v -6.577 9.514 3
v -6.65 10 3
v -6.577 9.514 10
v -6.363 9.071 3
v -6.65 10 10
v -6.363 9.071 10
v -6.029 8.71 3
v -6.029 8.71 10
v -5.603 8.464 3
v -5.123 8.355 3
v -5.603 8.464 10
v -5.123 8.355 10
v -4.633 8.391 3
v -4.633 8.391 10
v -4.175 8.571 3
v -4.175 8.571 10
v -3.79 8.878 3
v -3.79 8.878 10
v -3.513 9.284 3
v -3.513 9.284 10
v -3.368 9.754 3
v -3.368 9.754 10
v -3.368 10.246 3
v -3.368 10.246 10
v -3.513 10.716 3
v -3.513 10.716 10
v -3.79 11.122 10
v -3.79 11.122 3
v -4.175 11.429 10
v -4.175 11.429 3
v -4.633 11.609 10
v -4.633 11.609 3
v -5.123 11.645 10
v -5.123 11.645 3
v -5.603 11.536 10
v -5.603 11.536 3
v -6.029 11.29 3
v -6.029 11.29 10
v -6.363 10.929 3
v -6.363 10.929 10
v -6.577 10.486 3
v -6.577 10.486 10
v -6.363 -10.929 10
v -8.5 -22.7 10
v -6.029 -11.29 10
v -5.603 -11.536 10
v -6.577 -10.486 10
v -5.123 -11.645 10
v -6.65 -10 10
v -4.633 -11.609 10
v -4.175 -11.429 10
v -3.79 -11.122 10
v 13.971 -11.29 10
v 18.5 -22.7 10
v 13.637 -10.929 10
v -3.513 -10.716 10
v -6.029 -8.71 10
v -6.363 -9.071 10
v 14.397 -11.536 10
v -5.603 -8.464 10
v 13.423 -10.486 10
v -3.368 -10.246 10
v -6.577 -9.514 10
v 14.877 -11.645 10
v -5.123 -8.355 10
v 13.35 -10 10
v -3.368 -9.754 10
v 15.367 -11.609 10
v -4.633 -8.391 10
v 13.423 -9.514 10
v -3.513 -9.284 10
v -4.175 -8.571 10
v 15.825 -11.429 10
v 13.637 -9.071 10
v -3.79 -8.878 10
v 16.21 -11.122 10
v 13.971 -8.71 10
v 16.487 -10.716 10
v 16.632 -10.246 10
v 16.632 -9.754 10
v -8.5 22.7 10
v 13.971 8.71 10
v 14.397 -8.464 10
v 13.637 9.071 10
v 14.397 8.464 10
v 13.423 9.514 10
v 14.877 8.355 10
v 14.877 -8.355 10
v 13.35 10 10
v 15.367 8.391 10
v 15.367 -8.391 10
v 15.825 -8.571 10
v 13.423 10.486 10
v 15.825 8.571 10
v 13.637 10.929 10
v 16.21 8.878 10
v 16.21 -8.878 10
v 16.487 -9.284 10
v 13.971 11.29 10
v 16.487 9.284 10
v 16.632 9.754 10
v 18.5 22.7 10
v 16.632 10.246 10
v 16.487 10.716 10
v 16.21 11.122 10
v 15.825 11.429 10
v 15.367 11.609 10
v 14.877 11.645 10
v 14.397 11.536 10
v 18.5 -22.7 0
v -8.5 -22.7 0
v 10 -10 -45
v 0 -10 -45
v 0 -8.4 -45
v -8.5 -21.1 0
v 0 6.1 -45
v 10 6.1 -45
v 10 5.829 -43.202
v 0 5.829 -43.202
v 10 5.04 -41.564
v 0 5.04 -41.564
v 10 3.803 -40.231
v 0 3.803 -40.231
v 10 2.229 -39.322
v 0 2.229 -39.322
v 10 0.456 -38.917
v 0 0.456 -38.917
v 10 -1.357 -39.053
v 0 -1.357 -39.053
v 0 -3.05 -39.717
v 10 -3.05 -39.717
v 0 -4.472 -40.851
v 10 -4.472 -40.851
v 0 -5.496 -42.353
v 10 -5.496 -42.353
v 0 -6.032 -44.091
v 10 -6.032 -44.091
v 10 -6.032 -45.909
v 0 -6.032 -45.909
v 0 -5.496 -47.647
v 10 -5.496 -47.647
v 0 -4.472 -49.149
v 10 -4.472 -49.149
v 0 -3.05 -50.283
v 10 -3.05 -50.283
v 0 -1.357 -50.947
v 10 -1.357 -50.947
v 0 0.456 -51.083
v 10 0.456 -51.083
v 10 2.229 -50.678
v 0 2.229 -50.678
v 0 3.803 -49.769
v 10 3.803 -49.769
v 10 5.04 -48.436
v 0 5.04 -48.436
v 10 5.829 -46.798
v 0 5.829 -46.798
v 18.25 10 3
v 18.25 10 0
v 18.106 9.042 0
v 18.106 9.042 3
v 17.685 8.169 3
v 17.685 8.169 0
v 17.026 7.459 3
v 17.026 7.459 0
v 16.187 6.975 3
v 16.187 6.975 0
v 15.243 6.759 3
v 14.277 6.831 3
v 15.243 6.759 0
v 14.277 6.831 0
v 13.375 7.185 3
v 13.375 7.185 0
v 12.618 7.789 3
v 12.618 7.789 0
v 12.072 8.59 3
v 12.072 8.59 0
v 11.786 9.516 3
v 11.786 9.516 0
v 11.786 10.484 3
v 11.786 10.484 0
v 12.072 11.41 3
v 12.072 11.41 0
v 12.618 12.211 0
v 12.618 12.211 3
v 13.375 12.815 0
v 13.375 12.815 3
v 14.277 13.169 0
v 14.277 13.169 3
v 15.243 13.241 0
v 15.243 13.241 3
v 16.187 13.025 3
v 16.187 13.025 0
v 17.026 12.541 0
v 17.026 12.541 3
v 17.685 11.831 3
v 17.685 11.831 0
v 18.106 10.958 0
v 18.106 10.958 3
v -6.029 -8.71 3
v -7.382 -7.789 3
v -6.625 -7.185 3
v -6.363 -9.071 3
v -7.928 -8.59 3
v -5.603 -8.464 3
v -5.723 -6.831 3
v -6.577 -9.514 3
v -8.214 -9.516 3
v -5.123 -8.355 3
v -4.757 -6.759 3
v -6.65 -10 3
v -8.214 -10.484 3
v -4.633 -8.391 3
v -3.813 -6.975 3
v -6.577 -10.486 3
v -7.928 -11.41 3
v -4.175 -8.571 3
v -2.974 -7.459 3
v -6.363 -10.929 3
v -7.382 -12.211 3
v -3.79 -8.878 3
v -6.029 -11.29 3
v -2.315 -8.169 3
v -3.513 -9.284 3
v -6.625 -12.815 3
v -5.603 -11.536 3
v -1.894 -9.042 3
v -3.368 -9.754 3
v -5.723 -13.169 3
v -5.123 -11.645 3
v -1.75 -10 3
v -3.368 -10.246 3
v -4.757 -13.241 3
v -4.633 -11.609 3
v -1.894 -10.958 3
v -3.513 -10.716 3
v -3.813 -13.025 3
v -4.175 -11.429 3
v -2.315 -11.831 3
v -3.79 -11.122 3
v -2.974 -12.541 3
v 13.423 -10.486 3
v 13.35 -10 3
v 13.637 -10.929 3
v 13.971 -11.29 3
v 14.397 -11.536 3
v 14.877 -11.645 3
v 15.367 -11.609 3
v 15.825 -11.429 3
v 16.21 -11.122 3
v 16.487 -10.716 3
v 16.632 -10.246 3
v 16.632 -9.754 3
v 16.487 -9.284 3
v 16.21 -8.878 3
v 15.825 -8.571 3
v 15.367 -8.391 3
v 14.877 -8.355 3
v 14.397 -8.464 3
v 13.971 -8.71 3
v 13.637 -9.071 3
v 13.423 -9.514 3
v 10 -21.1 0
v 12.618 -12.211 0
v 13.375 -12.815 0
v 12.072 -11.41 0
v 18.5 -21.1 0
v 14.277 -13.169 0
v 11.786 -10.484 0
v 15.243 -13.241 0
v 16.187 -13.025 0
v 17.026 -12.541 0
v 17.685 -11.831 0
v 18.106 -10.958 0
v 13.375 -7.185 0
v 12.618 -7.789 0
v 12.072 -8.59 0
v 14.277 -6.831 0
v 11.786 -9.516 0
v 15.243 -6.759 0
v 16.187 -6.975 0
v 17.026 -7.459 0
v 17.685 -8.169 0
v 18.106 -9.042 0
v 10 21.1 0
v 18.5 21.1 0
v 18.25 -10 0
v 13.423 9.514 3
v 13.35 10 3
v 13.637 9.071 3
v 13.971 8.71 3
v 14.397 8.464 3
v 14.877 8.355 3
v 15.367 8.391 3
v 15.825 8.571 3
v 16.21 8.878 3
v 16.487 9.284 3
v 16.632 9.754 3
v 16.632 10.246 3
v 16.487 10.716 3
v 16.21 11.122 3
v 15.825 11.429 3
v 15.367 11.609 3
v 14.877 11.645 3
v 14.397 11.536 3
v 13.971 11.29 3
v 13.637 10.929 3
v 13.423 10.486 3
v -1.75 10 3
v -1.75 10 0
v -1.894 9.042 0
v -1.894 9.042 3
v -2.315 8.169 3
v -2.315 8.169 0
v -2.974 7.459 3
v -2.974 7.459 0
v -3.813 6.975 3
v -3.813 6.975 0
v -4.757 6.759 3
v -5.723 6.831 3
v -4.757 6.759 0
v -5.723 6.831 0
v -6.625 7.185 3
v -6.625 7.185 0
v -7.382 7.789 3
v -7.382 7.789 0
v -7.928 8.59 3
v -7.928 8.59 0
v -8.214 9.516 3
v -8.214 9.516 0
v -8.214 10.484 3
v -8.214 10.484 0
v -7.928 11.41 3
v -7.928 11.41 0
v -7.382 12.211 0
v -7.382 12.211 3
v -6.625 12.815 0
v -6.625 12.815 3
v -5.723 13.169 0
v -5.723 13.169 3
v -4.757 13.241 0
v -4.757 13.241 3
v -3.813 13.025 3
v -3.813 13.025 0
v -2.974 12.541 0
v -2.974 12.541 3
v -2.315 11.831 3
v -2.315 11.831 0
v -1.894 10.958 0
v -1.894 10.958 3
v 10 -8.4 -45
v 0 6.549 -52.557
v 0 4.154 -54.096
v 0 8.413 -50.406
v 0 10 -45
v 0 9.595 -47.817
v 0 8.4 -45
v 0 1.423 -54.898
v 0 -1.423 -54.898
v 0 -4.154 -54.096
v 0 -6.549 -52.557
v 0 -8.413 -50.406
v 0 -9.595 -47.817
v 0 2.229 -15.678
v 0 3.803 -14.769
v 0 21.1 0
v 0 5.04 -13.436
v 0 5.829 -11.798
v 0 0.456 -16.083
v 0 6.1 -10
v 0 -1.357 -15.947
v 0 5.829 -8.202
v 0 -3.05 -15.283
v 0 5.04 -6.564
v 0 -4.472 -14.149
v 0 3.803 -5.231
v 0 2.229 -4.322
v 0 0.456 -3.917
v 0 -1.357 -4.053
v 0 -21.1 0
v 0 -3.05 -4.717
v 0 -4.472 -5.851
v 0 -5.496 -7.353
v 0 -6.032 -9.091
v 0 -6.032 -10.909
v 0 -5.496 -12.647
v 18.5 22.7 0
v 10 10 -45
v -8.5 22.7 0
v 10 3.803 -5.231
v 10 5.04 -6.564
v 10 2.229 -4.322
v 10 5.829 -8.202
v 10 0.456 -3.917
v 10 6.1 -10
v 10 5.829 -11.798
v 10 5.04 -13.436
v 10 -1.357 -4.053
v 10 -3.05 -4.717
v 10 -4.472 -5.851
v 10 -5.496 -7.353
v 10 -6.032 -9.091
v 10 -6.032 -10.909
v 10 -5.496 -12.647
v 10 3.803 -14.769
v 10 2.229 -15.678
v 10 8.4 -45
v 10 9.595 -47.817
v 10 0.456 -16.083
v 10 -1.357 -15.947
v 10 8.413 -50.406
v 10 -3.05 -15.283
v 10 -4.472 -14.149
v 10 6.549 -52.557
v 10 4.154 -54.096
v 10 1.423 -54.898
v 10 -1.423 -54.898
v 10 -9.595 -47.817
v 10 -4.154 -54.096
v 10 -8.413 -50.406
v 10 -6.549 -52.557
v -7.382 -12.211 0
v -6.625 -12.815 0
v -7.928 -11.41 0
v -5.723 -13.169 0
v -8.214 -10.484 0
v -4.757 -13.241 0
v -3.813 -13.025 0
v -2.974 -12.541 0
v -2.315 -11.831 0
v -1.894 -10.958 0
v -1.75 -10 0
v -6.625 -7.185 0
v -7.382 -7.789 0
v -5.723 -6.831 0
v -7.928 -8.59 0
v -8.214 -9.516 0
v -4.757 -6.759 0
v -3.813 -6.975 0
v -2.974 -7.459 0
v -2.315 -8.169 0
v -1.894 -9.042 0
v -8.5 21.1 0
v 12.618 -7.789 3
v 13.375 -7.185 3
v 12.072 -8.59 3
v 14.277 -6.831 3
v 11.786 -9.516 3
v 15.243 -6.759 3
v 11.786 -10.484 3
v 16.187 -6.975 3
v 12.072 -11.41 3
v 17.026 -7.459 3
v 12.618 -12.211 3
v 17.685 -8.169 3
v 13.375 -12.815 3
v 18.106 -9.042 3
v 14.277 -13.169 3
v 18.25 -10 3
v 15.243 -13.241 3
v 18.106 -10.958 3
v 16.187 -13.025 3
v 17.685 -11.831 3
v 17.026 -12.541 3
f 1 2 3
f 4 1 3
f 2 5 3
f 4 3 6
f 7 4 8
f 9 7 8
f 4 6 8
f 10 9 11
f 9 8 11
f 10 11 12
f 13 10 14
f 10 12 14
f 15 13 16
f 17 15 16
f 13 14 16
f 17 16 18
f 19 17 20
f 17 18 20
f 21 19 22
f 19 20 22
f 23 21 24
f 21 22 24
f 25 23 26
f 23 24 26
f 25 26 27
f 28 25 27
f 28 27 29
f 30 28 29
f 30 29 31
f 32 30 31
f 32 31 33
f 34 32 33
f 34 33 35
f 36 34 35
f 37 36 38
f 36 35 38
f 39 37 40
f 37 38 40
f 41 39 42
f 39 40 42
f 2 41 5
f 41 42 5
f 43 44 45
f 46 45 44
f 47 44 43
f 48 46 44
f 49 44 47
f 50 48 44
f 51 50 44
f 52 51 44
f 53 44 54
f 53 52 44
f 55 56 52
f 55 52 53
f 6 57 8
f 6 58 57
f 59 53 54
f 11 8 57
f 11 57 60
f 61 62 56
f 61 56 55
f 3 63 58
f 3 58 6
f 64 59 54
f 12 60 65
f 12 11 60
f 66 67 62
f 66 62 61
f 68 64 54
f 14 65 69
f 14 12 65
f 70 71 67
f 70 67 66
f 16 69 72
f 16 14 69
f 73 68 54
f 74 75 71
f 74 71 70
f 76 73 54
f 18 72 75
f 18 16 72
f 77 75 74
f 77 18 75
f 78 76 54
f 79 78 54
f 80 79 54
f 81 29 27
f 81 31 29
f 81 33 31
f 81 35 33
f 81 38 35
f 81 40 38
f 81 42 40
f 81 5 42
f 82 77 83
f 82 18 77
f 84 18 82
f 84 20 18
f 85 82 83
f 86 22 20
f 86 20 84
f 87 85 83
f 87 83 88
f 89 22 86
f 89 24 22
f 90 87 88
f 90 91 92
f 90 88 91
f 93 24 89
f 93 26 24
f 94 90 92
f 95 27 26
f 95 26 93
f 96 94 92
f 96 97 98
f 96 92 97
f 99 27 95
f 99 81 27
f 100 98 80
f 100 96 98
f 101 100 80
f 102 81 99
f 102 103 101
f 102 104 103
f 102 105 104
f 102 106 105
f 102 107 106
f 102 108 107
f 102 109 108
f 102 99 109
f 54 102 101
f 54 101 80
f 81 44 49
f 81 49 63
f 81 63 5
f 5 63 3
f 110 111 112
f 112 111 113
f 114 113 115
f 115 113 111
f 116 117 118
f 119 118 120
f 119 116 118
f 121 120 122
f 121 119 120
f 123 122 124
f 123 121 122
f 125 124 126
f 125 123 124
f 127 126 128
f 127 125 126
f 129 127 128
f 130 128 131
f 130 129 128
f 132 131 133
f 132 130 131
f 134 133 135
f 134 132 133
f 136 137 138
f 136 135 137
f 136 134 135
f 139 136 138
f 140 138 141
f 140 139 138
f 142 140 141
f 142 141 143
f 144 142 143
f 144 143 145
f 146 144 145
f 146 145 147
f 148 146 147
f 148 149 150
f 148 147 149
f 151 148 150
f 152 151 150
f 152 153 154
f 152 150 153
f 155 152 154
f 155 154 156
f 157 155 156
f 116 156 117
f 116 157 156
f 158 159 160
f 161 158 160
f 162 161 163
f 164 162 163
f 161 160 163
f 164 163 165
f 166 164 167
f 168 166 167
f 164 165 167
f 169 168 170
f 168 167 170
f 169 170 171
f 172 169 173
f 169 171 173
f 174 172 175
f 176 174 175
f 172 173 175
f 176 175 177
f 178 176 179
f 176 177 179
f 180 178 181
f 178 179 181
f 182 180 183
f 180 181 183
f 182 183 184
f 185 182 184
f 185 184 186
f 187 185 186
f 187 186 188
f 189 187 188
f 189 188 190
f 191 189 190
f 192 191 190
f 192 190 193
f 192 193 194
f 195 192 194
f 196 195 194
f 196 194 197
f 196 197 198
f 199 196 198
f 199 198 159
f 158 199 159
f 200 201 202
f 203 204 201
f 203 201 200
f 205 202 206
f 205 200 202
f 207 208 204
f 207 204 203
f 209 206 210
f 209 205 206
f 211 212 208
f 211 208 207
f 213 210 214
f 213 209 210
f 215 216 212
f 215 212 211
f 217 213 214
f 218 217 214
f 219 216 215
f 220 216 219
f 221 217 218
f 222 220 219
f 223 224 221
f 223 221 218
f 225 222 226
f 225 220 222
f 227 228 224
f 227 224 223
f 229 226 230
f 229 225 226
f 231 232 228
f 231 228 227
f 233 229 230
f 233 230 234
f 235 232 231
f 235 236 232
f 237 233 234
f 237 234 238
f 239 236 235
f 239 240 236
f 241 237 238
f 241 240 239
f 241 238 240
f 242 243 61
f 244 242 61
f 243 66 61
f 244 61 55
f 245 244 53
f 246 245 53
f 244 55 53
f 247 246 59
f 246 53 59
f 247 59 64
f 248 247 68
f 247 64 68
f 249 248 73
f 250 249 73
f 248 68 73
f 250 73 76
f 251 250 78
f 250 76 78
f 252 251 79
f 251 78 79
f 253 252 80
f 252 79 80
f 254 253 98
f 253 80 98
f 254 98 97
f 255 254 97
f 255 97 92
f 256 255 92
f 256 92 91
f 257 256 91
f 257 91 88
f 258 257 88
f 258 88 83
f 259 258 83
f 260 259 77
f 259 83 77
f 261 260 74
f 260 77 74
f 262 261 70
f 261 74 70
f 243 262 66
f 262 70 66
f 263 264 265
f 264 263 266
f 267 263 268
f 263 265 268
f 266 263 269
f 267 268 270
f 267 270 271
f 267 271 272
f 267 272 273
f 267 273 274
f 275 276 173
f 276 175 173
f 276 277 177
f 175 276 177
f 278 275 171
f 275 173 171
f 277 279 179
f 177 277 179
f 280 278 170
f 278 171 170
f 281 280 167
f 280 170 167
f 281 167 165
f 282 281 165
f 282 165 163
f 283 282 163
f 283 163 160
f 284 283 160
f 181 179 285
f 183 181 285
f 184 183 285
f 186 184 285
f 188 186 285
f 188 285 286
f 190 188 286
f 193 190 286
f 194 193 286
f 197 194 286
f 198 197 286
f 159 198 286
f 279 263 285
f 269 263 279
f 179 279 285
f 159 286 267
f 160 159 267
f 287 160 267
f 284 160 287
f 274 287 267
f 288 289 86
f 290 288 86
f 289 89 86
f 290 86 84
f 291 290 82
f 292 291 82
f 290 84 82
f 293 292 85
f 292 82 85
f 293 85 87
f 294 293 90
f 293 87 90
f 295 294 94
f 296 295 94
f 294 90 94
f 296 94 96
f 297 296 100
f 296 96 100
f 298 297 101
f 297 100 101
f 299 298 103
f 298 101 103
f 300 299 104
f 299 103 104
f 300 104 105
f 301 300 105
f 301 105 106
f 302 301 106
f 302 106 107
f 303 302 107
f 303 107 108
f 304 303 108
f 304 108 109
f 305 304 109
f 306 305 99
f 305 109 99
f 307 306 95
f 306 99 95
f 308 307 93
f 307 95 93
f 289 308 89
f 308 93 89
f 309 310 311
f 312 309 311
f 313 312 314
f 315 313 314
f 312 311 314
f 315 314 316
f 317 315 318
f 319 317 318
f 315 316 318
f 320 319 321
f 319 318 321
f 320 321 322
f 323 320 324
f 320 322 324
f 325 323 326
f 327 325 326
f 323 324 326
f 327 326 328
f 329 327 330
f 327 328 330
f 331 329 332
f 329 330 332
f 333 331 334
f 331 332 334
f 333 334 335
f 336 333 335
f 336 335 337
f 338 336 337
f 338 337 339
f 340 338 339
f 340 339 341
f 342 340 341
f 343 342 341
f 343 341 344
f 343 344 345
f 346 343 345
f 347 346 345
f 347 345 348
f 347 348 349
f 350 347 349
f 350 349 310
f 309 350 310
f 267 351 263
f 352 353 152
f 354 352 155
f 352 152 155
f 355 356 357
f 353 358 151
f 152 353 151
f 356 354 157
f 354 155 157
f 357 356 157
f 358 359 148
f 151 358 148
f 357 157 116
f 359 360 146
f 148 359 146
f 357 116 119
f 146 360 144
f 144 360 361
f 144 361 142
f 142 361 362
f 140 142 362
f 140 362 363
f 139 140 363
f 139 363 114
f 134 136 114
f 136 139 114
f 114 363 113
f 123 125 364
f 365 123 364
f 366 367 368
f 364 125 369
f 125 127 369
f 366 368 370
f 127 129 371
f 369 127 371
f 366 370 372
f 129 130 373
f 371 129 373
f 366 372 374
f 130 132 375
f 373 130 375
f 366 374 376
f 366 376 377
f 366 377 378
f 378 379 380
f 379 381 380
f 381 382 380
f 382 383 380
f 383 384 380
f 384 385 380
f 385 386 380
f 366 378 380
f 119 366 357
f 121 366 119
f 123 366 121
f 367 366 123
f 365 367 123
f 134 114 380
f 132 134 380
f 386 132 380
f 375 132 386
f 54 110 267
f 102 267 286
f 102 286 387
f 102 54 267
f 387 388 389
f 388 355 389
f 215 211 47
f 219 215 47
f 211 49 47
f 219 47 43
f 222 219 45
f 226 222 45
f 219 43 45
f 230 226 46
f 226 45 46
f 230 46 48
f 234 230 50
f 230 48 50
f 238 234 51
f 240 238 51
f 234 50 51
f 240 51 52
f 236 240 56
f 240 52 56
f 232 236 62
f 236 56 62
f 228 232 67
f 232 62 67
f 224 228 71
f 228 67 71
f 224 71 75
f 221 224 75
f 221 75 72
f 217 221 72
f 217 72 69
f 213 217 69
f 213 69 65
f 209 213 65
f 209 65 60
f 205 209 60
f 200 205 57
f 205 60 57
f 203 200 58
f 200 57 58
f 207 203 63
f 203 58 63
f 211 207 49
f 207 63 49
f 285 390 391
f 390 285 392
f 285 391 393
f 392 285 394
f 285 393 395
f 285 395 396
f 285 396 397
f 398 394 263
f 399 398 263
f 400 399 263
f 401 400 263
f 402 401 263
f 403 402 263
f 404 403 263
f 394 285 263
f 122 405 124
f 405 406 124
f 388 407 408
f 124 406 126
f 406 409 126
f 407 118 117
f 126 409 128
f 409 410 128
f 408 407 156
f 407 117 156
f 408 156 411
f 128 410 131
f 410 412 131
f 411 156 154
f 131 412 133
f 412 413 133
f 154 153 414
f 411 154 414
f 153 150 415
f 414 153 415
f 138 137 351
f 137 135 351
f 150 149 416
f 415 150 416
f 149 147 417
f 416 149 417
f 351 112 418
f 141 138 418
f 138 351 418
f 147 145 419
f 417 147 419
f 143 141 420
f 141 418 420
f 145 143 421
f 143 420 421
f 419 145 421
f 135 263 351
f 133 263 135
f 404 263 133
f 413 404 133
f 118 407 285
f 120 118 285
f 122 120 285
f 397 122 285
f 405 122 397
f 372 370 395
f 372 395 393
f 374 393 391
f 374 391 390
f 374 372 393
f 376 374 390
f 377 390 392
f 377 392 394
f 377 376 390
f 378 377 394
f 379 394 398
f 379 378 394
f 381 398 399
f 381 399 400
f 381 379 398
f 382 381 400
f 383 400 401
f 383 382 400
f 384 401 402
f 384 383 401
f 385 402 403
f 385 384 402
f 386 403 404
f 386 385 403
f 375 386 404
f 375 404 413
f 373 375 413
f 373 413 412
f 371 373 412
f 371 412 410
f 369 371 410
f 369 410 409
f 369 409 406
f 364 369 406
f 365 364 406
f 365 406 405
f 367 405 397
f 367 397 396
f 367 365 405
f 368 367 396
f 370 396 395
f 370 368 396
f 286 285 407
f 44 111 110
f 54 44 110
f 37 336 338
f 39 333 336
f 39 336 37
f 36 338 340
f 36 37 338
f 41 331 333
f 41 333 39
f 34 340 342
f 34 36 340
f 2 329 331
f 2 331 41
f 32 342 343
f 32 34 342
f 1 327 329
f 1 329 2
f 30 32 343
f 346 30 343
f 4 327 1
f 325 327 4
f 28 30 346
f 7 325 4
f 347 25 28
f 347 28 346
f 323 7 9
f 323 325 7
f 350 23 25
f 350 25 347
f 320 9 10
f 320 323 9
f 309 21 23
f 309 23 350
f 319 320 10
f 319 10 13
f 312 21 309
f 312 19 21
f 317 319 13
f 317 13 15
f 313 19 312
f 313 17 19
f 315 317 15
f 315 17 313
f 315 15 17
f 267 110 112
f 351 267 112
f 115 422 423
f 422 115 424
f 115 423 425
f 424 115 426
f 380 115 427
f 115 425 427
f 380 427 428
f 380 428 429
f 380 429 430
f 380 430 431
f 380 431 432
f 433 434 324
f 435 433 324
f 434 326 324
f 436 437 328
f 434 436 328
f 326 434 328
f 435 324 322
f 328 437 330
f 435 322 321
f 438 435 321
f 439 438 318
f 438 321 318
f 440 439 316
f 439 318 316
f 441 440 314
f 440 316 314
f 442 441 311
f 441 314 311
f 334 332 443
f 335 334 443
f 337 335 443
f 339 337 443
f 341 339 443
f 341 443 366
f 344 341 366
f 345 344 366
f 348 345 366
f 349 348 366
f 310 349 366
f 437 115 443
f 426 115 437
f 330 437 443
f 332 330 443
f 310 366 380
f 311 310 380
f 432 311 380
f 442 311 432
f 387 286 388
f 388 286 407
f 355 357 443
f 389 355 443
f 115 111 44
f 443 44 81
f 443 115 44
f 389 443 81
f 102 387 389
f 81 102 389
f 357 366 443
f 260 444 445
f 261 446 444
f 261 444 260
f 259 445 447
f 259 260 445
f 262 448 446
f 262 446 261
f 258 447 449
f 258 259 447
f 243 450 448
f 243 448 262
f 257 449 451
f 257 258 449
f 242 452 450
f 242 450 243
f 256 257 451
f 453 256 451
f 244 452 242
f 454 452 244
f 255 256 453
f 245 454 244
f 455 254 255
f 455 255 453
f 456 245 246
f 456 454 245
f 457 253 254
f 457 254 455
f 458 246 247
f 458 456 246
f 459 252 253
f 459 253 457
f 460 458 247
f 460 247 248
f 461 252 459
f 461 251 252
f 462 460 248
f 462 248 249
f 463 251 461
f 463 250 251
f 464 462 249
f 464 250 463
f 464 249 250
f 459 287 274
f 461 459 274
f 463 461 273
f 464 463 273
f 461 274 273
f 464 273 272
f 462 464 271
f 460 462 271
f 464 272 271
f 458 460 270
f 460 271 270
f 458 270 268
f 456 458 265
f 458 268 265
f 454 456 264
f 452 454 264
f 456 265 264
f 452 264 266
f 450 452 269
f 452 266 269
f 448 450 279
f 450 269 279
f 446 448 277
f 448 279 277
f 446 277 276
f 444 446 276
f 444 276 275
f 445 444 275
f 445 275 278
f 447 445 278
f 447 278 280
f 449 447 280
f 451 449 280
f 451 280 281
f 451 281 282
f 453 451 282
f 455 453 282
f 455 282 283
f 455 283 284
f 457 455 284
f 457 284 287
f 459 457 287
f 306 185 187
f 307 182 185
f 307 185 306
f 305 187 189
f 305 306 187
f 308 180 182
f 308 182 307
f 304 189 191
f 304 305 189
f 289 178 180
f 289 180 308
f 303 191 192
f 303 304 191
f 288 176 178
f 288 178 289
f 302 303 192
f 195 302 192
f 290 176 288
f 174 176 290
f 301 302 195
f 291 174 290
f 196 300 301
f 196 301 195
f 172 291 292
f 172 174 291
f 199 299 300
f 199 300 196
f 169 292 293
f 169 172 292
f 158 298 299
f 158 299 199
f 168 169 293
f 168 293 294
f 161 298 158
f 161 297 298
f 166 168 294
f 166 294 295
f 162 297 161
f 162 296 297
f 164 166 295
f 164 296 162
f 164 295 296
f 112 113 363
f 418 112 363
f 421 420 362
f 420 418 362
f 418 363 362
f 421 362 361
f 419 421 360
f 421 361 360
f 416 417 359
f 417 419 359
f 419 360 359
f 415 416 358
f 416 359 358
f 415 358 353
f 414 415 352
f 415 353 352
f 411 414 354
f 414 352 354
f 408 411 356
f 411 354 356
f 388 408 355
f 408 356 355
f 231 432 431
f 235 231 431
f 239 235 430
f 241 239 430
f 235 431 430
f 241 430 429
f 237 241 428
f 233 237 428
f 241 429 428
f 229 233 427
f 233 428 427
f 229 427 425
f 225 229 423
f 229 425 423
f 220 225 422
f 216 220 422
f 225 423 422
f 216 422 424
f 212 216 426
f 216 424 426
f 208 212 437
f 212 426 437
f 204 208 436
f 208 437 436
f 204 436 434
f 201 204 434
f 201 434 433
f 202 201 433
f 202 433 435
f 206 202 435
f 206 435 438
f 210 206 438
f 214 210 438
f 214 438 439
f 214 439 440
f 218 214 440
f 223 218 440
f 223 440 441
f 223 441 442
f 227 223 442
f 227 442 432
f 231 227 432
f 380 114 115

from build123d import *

# Parameters (mm, degrees)
F0_R           = 6.1
F1_DEPTH       = 10
F2_W           = 8.5
F2_H           = 45.4
F2_W_2         = 10
F3_DEPTH       = 10
F5_D           = 3.3
F5_CBORE_D     = 6.5
F5_CBORE_DEPTH = 3
F7_DEPTH       = 8.5
F7_DEPTH_BACK  = 18.5
F9_DEPTH       = 45.401


with BuildPart() as f1:
    # F0 (on Right) → F1 (new body)
    with BuildSketch(Plane.YZ):
        with BuildLine():
            Line((22.7, 0), (0, 0))
            Line((0, 0), (-22.7, 0))
            Line((-22.7, 0), (-10, -45))
            ThreePointArc((-10, -45), (0, -35), (10, -45))
            Line((10, -45), (22.7, 0))
        make_face()
        with Locations((0, -10)):
            Circle(F0_R, mode=Mode.SUBTRACT)
        with BuildLine():
            ThreePointArc((10, -45), (0, -35), (-10, -45))
            ThreePointArc((-10, -45), (0, -55), (10, -45))
        make_face()
        with Locations((0, -45)):
            Circle(F0_R, mode=Mode.SUBTRACT)
    extrude(amount=F1_DEPTH)

    # F2 (on face) → F3 (join)
    with BuildSketch(Plane.XY):
        with Locations((14.25, 0)):
            Rectangle(F2_W, F2_H)
        with Locations((5, 0)):
            Rectangle(F2_W_2, F2_H)
        with Locations((-4.25, 0)):
            Rectangle(F2_W, F2_H)
    extrude(amount=F3_DEPTH)

    # F5 (through all)
    with Locations(Plane(origin=(0, 0, 0), x_dir=(1, 0, 0), z_dir=(0, 0, -1))):
        with Locations((-5, 10), (15, 10), (15, -10), (-5, -10)):
            CounterBoreHole(F5_D / 2, F5_CBORE_D / 2, F5_CBORE_DEPTH)

    # F6 (on face) → F7 (join, two sides)
    with BuildSketch(Plane.YZ.offset(10)) as f7_sk:
        with BuildLine():
            Line((21.1, 0), (8.4, -45))
            ThreePointArc((8.4, -45), (0, -53.4), (-8.4, -45))
            Line((-8.4, -45), (-21.1, 0))
            Line((-21.1, 0), (-22.7, 0))
            Line((-22.7, 0), (-10, -45))
            ThreePointArc((-10, -45), (0, -55), (10, -45))
            Line((10, -45), (22.7, 0))
            Line((22.7, 0), (21.1, 0))
        make_face()
    extrude(amount=F7_DEPTH)
    extrude(f7_sk.sketch, amount=-F7_DEPTH_BACK)

    # F8 (on face) → F9 (cut, through all)
    with BuildSketch(Plane.XZ.offset(22.7)):
        Polygon((0, -45), (-8.5, 0), (-8.5, -58.9339546859), (18.5, -58.9339546859), (18.5, 0), (10, -45), (10, -55), (0, -55), align=None)
    extrude(amount=-F9_DEPTH, mode=Mode.SUBTRACT)


solid = f1.part
